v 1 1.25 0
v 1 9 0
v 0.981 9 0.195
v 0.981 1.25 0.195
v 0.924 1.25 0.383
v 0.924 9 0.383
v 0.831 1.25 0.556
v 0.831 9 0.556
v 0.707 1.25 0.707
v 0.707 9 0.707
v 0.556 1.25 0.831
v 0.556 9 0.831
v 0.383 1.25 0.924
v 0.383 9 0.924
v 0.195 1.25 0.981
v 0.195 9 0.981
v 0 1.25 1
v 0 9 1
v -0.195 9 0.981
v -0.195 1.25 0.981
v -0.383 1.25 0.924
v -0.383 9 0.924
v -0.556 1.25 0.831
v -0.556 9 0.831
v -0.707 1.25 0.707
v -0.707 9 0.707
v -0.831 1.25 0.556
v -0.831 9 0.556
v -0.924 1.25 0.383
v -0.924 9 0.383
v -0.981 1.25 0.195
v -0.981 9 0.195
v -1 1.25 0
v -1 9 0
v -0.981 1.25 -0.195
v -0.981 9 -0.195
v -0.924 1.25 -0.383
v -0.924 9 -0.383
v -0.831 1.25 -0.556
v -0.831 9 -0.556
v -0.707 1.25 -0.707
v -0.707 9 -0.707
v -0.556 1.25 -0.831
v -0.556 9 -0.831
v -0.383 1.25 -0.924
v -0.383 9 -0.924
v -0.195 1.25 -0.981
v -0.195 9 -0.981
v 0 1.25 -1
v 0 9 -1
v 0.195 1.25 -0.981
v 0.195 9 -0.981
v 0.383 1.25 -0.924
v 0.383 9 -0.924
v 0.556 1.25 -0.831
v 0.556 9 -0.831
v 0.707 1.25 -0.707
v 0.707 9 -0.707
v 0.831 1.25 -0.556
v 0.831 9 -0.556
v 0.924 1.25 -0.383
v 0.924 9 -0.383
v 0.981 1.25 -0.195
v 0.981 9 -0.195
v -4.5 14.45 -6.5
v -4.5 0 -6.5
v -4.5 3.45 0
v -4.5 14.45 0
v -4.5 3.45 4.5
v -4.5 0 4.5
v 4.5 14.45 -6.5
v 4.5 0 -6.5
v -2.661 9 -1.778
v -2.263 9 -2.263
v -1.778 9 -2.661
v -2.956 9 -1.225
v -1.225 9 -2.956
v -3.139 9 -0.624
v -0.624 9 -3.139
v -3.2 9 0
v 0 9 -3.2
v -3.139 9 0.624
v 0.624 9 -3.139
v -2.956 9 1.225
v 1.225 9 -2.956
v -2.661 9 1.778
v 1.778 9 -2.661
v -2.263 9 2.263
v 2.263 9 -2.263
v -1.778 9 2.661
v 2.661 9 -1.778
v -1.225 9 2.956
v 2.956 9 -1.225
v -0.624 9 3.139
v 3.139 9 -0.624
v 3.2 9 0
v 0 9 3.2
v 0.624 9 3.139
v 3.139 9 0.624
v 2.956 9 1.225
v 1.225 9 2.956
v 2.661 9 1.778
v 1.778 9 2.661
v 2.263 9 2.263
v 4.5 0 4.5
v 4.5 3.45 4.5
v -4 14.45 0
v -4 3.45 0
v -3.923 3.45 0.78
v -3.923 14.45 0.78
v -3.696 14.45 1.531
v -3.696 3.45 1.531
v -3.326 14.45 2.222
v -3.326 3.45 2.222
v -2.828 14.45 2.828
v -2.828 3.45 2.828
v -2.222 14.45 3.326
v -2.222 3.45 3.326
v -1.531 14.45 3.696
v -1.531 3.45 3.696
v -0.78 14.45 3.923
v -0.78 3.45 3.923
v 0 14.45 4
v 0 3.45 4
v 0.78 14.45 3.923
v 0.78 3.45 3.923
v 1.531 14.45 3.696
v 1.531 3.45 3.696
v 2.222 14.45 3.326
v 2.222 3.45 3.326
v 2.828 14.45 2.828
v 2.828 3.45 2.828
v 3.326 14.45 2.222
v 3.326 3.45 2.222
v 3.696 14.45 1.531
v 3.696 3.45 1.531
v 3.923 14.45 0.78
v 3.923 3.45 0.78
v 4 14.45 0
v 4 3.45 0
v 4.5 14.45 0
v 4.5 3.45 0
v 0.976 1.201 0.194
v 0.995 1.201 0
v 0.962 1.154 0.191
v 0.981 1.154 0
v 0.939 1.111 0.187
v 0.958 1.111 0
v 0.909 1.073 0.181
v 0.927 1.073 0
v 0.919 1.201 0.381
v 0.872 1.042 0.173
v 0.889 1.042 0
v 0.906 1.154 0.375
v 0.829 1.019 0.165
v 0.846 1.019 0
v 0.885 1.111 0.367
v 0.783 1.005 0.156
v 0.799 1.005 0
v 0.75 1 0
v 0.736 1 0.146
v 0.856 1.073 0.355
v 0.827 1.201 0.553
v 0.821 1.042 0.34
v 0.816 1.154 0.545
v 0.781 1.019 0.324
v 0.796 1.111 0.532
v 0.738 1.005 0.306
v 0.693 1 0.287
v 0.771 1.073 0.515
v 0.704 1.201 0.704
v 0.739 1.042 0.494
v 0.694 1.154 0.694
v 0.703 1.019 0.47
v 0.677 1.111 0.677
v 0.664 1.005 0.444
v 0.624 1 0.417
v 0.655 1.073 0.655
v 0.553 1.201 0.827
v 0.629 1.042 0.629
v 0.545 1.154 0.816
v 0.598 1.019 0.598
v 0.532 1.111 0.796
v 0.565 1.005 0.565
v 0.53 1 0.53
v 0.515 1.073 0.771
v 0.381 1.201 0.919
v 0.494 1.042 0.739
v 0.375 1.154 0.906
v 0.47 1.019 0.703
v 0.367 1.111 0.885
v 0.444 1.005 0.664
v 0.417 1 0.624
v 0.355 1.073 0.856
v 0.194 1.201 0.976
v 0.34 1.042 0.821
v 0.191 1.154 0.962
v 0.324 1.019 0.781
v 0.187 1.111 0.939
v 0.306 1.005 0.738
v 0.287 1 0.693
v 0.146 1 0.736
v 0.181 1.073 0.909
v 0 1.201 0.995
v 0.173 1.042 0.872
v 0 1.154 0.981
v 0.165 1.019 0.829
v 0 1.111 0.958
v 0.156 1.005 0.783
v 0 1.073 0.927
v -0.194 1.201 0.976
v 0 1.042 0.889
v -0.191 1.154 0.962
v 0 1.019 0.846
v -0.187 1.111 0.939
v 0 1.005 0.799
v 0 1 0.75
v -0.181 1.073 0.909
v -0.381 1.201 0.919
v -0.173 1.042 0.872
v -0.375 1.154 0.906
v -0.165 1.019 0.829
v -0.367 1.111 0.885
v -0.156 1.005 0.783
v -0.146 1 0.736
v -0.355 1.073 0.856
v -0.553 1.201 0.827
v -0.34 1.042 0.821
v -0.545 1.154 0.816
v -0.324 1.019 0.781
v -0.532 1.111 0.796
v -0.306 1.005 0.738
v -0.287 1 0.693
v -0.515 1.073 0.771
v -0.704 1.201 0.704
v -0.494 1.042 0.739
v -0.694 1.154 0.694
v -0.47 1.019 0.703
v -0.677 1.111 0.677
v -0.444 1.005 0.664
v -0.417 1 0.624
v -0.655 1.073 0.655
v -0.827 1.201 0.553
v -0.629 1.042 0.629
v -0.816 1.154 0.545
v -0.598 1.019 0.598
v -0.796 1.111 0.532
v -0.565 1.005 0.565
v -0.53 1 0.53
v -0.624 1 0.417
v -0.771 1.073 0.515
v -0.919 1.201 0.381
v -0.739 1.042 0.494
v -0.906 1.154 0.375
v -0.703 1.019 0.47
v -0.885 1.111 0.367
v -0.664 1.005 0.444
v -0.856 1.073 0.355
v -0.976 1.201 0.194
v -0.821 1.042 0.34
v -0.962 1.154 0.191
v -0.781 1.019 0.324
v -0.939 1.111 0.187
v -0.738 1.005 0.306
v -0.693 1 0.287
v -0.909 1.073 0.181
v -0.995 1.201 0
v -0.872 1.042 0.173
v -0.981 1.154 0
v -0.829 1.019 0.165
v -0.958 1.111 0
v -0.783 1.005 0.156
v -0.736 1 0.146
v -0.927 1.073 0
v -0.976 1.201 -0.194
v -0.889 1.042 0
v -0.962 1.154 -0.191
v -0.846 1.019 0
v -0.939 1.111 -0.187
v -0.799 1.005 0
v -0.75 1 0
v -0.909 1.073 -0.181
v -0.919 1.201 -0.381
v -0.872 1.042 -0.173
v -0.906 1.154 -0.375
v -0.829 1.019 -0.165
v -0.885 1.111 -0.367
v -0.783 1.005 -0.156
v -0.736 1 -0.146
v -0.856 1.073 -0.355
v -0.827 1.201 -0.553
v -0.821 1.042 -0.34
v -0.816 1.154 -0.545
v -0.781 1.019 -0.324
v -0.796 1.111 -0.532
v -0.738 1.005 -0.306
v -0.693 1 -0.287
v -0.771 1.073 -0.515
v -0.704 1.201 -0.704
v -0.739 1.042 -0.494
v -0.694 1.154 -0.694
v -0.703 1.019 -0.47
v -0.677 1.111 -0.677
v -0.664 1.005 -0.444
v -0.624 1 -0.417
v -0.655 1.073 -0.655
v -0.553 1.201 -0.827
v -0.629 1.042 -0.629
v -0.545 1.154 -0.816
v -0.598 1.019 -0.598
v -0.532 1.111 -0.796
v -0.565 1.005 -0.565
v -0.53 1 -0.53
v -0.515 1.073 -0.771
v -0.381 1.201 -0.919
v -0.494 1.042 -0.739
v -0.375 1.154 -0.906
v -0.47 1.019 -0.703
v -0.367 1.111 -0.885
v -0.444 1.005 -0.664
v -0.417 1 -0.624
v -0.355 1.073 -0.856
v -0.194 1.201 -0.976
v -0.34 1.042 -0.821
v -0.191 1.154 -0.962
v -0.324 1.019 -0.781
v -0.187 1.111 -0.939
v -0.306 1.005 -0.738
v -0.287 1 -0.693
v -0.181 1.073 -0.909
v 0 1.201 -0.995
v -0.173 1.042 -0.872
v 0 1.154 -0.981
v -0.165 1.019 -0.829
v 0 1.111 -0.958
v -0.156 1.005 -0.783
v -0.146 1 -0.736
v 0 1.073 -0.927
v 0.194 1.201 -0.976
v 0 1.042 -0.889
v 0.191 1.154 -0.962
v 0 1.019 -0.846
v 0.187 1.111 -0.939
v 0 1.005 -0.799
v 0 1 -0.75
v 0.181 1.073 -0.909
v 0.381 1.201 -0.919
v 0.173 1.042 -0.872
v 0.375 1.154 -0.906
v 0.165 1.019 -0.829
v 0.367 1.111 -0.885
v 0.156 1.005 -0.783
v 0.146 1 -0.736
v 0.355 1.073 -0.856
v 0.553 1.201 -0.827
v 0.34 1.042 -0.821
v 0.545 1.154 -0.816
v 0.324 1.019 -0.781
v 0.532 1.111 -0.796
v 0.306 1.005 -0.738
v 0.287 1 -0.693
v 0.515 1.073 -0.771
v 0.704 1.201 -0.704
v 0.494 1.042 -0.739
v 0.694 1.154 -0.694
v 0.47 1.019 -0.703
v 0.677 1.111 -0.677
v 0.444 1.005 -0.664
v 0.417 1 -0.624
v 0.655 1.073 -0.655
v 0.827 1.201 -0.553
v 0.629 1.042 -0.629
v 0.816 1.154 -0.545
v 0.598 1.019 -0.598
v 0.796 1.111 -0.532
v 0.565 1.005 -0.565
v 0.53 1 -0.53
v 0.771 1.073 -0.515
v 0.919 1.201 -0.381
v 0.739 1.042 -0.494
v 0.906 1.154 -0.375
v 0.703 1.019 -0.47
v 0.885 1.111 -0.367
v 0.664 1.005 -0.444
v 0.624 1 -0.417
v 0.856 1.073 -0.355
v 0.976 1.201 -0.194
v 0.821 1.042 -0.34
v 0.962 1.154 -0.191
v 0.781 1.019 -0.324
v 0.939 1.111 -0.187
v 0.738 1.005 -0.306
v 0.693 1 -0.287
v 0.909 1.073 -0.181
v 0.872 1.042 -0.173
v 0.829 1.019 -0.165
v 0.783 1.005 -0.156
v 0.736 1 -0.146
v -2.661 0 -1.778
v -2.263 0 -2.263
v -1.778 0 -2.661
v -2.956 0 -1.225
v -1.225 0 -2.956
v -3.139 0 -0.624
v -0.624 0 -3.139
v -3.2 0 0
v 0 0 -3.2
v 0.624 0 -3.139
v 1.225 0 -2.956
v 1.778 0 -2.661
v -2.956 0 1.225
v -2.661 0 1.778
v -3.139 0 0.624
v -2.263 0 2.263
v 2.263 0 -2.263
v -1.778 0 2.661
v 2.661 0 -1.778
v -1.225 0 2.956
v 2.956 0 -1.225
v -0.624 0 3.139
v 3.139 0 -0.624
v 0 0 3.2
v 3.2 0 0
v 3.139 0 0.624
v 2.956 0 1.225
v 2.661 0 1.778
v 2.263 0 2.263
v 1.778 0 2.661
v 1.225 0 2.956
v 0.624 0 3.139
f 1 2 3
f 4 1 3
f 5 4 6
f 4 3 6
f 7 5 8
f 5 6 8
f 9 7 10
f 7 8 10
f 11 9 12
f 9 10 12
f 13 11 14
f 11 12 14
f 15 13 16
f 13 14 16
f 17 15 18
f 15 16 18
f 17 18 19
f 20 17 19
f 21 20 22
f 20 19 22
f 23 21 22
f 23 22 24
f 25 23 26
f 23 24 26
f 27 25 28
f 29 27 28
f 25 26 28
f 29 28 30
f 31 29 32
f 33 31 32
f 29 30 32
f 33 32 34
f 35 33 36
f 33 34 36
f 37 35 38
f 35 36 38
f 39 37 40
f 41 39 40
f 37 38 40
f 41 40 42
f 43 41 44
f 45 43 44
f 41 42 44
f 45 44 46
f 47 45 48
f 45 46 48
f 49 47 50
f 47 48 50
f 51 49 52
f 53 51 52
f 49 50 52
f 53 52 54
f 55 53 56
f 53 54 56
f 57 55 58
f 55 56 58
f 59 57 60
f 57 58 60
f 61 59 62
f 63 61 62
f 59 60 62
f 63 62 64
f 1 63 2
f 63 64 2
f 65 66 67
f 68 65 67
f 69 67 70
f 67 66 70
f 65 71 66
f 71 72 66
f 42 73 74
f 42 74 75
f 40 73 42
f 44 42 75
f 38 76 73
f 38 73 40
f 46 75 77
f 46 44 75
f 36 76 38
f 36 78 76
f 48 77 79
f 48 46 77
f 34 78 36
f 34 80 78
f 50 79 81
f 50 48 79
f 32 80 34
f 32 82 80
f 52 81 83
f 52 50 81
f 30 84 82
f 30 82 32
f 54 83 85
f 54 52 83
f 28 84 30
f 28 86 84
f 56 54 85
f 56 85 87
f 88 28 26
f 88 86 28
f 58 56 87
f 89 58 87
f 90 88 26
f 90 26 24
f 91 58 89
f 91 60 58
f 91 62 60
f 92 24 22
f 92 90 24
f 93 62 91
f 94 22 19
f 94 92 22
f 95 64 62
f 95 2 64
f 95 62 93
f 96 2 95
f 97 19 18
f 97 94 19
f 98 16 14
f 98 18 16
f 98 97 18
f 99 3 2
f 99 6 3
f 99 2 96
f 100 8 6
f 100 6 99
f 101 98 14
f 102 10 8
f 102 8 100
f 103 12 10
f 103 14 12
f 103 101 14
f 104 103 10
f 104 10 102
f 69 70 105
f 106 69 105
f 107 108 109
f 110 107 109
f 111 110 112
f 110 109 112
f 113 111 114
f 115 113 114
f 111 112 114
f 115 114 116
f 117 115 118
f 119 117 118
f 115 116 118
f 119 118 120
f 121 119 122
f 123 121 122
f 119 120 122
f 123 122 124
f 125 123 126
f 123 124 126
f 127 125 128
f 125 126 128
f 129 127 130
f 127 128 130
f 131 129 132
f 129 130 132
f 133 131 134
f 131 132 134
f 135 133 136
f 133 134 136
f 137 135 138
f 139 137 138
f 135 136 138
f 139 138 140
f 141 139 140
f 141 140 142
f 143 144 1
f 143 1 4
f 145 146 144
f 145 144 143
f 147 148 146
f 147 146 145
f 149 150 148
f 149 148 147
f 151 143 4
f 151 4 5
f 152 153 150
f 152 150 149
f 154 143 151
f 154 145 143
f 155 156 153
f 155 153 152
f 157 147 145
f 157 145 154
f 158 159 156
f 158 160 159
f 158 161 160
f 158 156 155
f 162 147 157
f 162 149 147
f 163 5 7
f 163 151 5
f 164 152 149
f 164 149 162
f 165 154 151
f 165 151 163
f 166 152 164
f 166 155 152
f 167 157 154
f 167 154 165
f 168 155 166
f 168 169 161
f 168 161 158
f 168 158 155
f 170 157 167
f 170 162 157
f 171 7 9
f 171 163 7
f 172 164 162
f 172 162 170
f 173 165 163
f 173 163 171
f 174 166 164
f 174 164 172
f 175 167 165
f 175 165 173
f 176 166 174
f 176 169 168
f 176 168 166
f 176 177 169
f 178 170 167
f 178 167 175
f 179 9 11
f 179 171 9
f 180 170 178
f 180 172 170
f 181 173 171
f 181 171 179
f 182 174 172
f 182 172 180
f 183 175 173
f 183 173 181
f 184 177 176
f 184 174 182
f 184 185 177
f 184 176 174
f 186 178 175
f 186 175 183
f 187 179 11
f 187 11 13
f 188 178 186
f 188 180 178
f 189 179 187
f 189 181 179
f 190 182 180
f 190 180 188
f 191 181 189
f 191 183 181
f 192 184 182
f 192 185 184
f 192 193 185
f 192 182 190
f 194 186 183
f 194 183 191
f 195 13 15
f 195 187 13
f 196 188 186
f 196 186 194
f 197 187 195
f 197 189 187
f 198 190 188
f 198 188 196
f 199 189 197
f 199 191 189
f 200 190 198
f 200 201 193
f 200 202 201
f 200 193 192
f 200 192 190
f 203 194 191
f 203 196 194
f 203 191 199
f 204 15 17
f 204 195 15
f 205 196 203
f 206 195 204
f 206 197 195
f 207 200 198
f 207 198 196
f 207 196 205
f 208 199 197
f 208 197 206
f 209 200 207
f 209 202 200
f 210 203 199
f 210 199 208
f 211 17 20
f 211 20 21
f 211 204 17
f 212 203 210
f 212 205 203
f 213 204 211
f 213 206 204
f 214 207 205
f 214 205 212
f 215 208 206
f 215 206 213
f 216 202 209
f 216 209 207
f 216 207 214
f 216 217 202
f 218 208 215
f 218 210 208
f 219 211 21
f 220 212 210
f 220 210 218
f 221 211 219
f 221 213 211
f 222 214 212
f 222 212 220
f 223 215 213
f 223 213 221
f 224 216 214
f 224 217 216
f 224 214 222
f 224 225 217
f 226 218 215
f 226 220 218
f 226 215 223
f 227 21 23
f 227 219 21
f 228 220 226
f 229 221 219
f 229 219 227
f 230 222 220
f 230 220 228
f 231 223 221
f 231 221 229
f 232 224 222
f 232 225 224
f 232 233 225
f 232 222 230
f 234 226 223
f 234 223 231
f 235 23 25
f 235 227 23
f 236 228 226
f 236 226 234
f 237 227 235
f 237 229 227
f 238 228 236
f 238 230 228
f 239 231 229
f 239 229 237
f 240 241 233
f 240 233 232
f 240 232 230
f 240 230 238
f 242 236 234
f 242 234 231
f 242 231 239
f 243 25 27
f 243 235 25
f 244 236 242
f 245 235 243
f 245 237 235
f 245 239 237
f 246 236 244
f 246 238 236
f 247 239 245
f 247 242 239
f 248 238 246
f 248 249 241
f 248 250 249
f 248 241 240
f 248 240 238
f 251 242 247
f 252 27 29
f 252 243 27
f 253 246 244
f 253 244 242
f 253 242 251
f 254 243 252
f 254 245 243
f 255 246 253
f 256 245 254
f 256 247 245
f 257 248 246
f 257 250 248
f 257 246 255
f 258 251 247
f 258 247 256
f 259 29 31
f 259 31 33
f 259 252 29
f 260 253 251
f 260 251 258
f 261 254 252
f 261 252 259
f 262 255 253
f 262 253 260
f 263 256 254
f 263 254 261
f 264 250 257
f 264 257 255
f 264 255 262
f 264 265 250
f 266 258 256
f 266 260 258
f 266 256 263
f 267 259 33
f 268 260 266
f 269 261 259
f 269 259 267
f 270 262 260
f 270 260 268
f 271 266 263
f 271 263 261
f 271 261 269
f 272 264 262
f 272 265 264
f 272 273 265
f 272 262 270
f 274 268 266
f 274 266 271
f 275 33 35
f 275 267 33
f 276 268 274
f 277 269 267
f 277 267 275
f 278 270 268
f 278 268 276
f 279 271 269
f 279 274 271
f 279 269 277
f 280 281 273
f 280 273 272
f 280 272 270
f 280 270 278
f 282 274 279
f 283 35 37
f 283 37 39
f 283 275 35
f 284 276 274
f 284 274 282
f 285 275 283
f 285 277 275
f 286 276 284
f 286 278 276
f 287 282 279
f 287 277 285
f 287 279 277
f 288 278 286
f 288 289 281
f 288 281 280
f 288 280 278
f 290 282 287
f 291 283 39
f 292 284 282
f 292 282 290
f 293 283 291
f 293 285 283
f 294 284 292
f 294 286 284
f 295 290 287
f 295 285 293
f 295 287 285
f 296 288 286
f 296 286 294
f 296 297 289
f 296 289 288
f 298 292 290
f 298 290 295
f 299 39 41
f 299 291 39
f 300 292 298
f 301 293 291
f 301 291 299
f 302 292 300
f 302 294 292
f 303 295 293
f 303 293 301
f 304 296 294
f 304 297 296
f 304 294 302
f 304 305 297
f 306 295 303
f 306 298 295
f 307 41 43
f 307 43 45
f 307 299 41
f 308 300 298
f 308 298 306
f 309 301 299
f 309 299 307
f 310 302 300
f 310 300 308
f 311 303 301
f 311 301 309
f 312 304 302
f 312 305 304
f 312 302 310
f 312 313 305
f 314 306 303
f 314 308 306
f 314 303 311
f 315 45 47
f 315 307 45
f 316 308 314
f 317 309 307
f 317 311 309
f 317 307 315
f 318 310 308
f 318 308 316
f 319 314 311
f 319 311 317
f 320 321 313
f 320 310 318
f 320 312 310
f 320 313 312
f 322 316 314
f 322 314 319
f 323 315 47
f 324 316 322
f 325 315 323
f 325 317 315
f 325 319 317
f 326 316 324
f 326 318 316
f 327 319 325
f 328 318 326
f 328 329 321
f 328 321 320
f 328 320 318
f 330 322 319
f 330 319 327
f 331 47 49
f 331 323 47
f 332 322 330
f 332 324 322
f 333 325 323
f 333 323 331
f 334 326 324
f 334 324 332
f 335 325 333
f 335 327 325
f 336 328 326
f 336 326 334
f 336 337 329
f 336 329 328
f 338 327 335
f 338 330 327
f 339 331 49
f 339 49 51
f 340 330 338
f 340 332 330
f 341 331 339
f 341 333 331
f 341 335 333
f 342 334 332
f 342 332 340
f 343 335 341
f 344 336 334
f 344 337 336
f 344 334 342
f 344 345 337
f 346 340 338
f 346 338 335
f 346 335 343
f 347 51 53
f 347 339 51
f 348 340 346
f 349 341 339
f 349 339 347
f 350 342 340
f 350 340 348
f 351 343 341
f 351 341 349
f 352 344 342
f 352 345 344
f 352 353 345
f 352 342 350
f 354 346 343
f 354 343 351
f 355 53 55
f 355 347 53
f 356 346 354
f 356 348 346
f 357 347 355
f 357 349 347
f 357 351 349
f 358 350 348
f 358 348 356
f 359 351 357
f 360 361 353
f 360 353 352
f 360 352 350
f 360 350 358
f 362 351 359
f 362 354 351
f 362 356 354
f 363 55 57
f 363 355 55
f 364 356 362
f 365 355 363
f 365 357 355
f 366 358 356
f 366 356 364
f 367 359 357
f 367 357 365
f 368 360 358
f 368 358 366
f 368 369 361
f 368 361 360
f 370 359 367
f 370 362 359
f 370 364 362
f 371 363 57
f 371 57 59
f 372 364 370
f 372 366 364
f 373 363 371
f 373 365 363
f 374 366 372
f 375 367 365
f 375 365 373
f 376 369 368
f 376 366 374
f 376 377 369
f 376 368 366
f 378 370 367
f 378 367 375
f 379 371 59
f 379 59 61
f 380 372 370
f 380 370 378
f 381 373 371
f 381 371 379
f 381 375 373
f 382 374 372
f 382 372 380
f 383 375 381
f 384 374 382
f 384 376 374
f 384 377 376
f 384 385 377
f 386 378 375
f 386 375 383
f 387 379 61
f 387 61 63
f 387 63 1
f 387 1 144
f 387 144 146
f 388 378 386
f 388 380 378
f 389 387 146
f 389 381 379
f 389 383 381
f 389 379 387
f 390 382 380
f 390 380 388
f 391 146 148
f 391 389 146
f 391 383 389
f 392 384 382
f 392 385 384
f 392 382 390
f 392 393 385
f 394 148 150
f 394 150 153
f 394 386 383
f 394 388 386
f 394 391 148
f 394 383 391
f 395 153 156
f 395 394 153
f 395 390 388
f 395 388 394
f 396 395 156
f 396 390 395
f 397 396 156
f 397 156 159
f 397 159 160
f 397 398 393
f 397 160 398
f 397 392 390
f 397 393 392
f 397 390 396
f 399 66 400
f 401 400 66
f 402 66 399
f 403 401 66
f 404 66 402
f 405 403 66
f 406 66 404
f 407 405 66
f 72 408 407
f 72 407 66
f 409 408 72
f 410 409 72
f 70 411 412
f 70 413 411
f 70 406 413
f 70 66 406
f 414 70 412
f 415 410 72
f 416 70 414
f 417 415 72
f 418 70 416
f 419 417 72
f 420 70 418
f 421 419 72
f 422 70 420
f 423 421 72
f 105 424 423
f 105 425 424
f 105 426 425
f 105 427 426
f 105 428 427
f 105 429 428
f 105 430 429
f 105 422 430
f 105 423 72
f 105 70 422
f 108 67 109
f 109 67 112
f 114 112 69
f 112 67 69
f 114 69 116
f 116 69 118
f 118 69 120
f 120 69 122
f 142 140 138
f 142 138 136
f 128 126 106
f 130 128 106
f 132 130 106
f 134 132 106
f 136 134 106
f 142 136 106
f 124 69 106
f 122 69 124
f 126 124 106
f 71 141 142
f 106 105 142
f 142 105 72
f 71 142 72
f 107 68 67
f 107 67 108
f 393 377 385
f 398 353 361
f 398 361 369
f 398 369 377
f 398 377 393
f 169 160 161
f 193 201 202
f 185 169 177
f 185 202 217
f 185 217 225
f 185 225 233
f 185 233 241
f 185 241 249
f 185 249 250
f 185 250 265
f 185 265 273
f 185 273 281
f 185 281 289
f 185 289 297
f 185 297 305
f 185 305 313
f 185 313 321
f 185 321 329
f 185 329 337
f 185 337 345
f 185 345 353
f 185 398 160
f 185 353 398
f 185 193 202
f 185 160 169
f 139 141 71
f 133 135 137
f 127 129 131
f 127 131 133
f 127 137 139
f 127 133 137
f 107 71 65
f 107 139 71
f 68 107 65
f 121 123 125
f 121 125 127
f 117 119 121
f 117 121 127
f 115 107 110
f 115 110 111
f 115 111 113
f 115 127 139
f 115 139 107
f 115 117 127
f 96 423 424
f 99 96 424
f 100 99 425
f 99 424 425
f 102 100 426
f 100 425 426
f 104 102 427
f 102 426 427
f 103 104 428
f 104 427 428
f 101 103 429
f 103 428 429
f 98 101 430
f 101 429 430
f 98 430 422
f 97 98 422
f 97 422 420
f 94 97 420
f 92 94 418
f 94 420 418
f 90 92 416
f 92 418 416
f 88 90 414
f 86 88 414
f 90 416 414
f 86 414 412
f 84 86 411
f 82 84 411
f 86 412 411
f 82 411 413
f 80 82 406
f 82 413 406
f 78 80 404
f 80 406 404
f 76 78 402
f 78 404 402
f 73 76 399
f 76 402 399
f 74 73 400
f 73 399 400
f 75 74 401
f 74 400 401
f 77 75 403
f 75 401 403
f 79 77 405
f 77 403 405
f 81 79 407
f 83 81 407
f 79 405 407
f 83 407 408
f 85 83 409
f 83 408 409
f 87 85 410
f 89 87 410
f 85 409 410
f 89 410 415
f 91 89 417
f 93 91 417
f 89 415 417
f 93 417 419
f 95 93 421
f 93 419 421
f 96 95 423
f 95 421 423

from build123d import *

# Parameters (mm, degrees)
F0_W     = 9
F0_H     = 11
F1_DEPTH = 3.45
F3_DEPTH = 11
F4_R     = 3.2
F5_DEPTH = 9
F6_R     = 1
F7_DEPTH = 8
F8_R     = 0.25


with BuildPart() as f1:
    # F0 (on Front) → F1 (new body)
    with BuildSketch(Plane.XZ):
        with Locations((0, -1)):
            Rectangle(F0_W, F0_H)
    extrude(amount=-F1_DEPTH)

    # F2 (on face) → F3 (join)
    with BuildSketch(Plane(origin=(0, 3.45, 0), x_dir=(-1, 0, 0), z_dir=(0, 1, 0))):
        with BuildLine():
            ThreePointArc((4, 0), (0, 4), (-4, 0))
            Line((-4, 0), (-4.5, 0))
            Line((-4.5, 0), (-4.5, -6.5))
            Line((-4.5, -6.5), (4.5, -6.5))
            Line((4.5, -6.5), (4.5, 0))
            Line((4.5, 0), (4, 0))
        make_face()
    extrude(amount=F3_DEPTH)

    # F4 (on face) → F5 (cut)
    with BuildSketch(Plane.XZ):
        Circle(F4_R)
    extrude(amount=-F5_DEPTH, mode=Mode.SUBTRACT)

    # F6 (on face) → F7 (join)
    with BuildSketch(Plane.XZ.offset(-9)):
        Circle(F6_R)
    extrude(amount=F7_DEPTH)

    # F8
    f8_edges = [f1.edges().sort_by_distance(p)[0] for p in [
        (-1, 1, 0),
    ]]
    fillet(f8_edges, radius=F8_R)


solid = f1.part
